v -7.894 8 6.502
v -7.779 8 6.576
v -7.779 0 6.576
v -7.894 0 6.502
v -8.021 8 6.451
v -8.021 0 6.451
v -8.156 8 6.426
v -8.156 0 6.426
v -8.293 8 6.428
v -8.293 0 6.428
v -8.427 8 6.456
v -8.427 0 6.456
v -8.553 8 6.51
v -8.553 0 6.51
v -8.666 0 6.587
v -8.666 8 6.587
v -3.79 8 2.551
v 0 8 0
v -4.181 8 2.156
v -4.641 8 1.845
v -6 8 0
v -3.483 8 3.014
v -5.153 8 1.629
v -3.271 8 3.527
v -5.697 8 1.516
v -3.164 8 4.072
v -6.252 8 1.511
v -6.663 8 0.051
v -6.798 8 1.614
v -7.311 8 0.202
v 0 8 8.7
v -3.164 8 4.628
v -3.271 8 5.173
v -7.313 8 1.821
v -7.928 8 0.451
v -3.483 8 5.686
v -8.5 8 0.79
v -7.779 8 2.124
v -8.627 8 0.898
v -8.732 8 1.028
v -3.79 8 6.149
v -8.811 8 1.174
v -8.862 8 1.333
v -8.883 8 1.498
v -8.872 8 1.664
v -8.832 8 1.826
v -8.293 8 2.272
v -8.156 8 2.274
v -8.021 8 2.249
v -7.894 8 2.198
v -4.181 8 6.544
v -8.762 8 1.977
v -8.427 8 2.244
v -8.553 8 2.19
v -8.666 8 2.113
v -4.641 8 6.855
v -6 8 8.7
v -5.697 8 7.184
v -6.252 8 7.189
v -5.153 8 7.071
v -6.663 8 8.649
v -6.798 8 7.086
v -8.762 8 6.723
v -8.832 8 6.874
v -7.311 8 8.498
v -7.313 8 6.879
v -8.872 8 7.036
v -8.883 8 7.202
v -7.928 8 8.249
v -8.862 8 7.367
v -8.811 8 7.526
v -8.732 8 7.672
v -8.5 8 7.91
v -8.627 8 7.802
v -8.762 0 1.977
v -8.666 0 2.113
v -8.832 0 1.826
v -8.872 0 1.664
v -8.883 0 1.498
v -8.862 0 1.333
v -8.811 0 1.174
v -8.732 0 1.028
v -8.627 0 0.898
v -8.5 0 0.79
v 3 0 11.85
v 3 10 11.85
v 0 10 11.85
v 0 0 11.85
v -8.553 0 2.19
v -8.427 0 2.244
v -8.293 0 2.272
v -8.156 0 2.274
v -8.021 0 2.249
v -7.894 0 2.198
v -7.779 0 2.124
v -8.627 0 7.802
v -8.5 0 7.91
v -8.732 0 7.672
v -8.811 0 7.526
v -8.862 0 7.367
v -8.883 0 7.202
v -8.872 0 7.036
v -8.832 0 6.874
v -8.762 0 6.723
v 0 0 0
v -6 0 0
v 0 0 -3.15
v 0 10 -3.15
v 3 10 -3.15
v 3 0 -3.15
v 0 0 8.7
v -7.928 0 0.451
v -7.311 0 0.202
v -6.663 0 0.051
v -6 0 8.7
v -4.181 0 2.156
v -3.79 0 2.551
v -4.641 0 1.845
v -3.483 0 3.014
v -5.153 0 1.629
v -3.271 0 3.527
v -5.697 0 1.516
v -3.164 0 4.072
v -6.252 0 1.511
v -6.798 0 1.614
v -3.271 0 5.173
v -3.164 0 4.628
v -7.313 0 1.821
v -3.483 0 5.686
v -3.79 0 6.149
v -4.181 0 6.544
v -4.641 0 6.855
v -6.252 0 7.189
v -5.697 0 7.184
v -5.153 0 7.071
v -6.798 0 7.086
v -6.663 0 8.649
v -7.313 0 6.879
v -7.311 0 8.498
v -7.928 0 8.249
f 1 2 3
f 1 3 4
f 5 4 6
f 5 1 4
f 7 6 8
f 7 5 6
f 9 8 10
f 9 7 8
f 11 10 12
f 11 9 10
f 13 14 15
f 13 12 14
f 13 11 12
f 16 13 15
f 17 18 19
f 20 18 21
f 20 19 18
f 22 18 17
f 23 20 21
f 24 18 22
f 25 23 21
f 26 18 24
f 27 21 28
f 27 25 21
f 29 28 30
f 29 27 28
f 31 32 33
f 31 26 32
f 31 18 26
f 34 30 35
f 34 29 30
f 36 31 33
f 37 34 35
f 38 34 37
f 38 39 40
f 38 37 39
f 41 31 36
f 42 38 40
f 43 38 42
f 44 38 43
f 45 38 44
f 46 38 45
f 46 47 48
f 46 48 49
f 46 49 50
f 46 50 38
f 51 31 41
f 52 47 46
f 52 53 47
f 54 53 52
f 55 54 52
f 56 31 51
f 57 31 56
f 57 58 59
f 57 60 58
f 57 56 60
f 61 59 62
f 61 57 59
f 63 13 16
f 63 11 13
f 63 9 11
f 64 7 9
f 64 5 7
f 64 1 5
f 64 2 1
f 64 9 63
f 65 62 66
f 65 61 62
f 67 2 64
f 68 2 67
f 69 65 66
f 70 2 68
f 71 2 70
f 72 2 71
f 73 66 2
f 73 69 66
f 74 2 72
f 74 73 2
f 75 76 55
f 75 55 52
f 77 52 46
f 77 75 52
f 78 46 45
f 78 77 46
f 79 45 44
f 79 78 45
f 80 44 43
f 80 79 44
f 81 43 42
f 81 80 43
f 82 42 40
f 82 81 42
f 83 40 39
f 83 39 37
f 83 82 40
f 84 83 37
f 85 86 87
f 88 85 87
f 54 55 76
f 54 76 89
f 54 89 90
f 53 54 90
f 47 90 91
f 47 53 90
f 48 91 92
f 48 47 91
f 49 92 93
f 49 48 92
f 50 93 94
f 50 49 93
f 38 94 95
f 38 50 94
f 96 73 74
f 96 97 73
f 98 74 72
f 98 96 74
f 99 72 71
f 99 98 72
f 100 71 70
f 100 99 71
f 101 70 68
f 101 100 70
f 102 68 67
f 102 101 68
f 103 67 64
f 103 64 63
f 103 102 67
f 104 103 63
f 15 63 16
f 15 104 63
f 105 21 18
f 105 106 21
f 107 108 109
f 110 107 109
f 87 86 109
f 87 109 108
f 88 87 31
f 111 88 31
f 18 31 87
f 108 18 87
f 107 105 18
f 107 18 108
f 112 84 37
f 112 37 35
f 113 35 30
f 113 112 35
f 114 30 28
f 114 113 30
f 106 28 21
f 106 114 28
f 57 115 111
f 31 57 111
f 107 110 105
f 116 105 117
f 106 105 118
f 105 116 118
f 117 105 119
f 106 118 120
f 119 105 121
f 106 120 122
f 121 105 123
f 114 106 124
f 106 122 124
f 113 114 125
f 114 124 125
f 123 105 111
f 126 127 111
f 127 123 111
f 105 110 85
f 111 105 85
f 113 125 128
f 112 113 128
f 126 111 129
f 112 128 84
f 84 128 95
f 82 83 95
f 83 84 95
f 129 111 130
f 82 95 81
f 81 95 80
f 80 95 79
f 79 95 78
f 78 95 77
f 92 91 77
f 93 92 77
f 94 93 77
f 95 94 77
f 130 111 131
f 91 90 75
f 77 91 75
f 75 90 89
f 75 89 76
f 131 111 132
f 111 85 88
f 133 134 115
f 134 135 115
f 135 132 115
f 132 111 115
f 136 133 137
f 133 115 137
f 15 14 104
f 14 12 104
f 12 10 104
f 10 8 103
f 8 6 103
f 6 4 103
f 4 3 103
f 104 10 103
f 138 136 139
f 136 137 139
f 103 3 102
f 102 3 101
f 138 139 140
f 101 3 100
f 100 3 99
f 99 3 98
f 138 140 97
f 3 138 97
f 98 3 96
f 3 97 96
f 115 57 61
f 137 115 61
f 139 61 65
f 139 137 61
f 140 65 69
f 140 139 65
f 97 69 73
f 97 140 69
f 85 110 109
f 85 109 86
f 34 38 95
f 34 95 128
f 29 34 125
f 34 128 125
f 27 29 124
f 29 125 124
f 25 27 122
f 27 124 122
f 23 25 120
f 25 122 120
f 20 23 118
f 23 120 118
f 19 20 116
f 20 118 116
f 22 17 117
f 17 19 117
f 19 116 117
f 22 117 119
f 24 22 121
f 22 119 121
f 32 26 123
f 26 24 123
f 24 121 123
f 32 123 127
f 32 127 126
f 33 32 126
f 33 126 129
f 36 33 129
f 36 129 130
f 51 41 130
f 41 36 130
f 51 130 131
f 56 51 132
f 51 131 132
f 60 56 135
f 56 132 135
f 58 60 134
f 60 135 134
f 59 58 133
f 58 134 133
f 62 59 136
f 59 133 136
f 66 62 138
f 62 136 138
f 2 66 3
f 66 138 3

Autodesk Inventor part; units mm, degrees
ref_plane "YZ Plane" through (0, 0, 0) normal (1, 0, 0) x (0, 1, 0)
ref_plane "XZ Plane" through (0, 0, 0) normal (0, 1, 0) x (-1, 0, 0)
ref_plane "XY Plane" through (0, 0, 0) normal (0, 0, 1) x (1, 0, 0)
sketch "Эскиз1" plane through (0, 0, 0) normal (0, 1, 0) x (-1, 0, 0)
  line L0 (0, 25.8601) -> (0, -22.7313) construction
  arc A0 (8.1832, 2.5181) -> (8.1832, 6.1819) centre (6, 4.35) ccw construction
  line L1 (6, 4.35) -> (8.85, 4.35) construction
  line L2 (6, 4.35) -> (8.1832, 2.5181) construction
  line L3 (6, 4.35) -> (8.1832, 6.1819) construction
  arc A1 (6, 8.7) -> (6, 0) centre (6, 4.35) ccw construction
  line L4 (6, 0) -> (0, 0)
  line L5 (6, 8.7) -> (0, 8.7)
  arc A2 (9.3323, 7.1461) -> (6, 8.7) centre (6, 4.35) ccw
  arc A3 (9.3323, 1.5539) -> (9.3323, 7.1461) centre (6, 4.35) ccw construction
  arc A4 (6, 0) -> (9.3323, 1.5539) centre (6, 4.35) ccw
  line L6 (8.1832, 2.5181) -> (9.3323, 1.5539)
  line L7 (8.1832, 6.1819) -> (9.3323, 7.1461)
  arc A5 (8.1832, 6.1819) -> (8.1832, 2.5181) centre (6, 4.35) ccw
  line L8 (0, 0) -> (0, 8.7)
  line L9 (-3, 11.85) -> (0, 11.85)
  line L10 (0, 11.85) -> (0, -3.15)
  line L11 (0, -3.15) -> (-3, -3.15)
  line L12 (-3, -3.15) -> (-3, 11.85)
  point P0 (0, 4.35)
  point P1 (0, 0)
  point P2 (0, 8.7)
  dimension "d0" = 5.7
  dimension "d1" = 80
  dimension "d3" = 6
  dimension "d6" = 15
  dimension "d7" = 3
  dimension "d12" = 1.5
  dimension "d15" = 80
extrude "Выдавливание1" add sketch "Эскиз1" along normal blind 8 contours L4 L8 L5 A2 L7 A5 L6 A4
extrude "Выдавливание2" add sketch "Эскиз1" along normal blind 10 contours L10 L11 L12 L9 L8
fillet "Сопряжение3" radius 0.7 2 edges at (-8.1832, 4, 2.5181) (-8.1832, 4, 6.1819)
fillet "Сопряжение4" radius 0.9 2 edges at (-9.3323, 4, 1.5539) (-9.3323, 4, 7.1461)
properties part number "stand_mount_example"
